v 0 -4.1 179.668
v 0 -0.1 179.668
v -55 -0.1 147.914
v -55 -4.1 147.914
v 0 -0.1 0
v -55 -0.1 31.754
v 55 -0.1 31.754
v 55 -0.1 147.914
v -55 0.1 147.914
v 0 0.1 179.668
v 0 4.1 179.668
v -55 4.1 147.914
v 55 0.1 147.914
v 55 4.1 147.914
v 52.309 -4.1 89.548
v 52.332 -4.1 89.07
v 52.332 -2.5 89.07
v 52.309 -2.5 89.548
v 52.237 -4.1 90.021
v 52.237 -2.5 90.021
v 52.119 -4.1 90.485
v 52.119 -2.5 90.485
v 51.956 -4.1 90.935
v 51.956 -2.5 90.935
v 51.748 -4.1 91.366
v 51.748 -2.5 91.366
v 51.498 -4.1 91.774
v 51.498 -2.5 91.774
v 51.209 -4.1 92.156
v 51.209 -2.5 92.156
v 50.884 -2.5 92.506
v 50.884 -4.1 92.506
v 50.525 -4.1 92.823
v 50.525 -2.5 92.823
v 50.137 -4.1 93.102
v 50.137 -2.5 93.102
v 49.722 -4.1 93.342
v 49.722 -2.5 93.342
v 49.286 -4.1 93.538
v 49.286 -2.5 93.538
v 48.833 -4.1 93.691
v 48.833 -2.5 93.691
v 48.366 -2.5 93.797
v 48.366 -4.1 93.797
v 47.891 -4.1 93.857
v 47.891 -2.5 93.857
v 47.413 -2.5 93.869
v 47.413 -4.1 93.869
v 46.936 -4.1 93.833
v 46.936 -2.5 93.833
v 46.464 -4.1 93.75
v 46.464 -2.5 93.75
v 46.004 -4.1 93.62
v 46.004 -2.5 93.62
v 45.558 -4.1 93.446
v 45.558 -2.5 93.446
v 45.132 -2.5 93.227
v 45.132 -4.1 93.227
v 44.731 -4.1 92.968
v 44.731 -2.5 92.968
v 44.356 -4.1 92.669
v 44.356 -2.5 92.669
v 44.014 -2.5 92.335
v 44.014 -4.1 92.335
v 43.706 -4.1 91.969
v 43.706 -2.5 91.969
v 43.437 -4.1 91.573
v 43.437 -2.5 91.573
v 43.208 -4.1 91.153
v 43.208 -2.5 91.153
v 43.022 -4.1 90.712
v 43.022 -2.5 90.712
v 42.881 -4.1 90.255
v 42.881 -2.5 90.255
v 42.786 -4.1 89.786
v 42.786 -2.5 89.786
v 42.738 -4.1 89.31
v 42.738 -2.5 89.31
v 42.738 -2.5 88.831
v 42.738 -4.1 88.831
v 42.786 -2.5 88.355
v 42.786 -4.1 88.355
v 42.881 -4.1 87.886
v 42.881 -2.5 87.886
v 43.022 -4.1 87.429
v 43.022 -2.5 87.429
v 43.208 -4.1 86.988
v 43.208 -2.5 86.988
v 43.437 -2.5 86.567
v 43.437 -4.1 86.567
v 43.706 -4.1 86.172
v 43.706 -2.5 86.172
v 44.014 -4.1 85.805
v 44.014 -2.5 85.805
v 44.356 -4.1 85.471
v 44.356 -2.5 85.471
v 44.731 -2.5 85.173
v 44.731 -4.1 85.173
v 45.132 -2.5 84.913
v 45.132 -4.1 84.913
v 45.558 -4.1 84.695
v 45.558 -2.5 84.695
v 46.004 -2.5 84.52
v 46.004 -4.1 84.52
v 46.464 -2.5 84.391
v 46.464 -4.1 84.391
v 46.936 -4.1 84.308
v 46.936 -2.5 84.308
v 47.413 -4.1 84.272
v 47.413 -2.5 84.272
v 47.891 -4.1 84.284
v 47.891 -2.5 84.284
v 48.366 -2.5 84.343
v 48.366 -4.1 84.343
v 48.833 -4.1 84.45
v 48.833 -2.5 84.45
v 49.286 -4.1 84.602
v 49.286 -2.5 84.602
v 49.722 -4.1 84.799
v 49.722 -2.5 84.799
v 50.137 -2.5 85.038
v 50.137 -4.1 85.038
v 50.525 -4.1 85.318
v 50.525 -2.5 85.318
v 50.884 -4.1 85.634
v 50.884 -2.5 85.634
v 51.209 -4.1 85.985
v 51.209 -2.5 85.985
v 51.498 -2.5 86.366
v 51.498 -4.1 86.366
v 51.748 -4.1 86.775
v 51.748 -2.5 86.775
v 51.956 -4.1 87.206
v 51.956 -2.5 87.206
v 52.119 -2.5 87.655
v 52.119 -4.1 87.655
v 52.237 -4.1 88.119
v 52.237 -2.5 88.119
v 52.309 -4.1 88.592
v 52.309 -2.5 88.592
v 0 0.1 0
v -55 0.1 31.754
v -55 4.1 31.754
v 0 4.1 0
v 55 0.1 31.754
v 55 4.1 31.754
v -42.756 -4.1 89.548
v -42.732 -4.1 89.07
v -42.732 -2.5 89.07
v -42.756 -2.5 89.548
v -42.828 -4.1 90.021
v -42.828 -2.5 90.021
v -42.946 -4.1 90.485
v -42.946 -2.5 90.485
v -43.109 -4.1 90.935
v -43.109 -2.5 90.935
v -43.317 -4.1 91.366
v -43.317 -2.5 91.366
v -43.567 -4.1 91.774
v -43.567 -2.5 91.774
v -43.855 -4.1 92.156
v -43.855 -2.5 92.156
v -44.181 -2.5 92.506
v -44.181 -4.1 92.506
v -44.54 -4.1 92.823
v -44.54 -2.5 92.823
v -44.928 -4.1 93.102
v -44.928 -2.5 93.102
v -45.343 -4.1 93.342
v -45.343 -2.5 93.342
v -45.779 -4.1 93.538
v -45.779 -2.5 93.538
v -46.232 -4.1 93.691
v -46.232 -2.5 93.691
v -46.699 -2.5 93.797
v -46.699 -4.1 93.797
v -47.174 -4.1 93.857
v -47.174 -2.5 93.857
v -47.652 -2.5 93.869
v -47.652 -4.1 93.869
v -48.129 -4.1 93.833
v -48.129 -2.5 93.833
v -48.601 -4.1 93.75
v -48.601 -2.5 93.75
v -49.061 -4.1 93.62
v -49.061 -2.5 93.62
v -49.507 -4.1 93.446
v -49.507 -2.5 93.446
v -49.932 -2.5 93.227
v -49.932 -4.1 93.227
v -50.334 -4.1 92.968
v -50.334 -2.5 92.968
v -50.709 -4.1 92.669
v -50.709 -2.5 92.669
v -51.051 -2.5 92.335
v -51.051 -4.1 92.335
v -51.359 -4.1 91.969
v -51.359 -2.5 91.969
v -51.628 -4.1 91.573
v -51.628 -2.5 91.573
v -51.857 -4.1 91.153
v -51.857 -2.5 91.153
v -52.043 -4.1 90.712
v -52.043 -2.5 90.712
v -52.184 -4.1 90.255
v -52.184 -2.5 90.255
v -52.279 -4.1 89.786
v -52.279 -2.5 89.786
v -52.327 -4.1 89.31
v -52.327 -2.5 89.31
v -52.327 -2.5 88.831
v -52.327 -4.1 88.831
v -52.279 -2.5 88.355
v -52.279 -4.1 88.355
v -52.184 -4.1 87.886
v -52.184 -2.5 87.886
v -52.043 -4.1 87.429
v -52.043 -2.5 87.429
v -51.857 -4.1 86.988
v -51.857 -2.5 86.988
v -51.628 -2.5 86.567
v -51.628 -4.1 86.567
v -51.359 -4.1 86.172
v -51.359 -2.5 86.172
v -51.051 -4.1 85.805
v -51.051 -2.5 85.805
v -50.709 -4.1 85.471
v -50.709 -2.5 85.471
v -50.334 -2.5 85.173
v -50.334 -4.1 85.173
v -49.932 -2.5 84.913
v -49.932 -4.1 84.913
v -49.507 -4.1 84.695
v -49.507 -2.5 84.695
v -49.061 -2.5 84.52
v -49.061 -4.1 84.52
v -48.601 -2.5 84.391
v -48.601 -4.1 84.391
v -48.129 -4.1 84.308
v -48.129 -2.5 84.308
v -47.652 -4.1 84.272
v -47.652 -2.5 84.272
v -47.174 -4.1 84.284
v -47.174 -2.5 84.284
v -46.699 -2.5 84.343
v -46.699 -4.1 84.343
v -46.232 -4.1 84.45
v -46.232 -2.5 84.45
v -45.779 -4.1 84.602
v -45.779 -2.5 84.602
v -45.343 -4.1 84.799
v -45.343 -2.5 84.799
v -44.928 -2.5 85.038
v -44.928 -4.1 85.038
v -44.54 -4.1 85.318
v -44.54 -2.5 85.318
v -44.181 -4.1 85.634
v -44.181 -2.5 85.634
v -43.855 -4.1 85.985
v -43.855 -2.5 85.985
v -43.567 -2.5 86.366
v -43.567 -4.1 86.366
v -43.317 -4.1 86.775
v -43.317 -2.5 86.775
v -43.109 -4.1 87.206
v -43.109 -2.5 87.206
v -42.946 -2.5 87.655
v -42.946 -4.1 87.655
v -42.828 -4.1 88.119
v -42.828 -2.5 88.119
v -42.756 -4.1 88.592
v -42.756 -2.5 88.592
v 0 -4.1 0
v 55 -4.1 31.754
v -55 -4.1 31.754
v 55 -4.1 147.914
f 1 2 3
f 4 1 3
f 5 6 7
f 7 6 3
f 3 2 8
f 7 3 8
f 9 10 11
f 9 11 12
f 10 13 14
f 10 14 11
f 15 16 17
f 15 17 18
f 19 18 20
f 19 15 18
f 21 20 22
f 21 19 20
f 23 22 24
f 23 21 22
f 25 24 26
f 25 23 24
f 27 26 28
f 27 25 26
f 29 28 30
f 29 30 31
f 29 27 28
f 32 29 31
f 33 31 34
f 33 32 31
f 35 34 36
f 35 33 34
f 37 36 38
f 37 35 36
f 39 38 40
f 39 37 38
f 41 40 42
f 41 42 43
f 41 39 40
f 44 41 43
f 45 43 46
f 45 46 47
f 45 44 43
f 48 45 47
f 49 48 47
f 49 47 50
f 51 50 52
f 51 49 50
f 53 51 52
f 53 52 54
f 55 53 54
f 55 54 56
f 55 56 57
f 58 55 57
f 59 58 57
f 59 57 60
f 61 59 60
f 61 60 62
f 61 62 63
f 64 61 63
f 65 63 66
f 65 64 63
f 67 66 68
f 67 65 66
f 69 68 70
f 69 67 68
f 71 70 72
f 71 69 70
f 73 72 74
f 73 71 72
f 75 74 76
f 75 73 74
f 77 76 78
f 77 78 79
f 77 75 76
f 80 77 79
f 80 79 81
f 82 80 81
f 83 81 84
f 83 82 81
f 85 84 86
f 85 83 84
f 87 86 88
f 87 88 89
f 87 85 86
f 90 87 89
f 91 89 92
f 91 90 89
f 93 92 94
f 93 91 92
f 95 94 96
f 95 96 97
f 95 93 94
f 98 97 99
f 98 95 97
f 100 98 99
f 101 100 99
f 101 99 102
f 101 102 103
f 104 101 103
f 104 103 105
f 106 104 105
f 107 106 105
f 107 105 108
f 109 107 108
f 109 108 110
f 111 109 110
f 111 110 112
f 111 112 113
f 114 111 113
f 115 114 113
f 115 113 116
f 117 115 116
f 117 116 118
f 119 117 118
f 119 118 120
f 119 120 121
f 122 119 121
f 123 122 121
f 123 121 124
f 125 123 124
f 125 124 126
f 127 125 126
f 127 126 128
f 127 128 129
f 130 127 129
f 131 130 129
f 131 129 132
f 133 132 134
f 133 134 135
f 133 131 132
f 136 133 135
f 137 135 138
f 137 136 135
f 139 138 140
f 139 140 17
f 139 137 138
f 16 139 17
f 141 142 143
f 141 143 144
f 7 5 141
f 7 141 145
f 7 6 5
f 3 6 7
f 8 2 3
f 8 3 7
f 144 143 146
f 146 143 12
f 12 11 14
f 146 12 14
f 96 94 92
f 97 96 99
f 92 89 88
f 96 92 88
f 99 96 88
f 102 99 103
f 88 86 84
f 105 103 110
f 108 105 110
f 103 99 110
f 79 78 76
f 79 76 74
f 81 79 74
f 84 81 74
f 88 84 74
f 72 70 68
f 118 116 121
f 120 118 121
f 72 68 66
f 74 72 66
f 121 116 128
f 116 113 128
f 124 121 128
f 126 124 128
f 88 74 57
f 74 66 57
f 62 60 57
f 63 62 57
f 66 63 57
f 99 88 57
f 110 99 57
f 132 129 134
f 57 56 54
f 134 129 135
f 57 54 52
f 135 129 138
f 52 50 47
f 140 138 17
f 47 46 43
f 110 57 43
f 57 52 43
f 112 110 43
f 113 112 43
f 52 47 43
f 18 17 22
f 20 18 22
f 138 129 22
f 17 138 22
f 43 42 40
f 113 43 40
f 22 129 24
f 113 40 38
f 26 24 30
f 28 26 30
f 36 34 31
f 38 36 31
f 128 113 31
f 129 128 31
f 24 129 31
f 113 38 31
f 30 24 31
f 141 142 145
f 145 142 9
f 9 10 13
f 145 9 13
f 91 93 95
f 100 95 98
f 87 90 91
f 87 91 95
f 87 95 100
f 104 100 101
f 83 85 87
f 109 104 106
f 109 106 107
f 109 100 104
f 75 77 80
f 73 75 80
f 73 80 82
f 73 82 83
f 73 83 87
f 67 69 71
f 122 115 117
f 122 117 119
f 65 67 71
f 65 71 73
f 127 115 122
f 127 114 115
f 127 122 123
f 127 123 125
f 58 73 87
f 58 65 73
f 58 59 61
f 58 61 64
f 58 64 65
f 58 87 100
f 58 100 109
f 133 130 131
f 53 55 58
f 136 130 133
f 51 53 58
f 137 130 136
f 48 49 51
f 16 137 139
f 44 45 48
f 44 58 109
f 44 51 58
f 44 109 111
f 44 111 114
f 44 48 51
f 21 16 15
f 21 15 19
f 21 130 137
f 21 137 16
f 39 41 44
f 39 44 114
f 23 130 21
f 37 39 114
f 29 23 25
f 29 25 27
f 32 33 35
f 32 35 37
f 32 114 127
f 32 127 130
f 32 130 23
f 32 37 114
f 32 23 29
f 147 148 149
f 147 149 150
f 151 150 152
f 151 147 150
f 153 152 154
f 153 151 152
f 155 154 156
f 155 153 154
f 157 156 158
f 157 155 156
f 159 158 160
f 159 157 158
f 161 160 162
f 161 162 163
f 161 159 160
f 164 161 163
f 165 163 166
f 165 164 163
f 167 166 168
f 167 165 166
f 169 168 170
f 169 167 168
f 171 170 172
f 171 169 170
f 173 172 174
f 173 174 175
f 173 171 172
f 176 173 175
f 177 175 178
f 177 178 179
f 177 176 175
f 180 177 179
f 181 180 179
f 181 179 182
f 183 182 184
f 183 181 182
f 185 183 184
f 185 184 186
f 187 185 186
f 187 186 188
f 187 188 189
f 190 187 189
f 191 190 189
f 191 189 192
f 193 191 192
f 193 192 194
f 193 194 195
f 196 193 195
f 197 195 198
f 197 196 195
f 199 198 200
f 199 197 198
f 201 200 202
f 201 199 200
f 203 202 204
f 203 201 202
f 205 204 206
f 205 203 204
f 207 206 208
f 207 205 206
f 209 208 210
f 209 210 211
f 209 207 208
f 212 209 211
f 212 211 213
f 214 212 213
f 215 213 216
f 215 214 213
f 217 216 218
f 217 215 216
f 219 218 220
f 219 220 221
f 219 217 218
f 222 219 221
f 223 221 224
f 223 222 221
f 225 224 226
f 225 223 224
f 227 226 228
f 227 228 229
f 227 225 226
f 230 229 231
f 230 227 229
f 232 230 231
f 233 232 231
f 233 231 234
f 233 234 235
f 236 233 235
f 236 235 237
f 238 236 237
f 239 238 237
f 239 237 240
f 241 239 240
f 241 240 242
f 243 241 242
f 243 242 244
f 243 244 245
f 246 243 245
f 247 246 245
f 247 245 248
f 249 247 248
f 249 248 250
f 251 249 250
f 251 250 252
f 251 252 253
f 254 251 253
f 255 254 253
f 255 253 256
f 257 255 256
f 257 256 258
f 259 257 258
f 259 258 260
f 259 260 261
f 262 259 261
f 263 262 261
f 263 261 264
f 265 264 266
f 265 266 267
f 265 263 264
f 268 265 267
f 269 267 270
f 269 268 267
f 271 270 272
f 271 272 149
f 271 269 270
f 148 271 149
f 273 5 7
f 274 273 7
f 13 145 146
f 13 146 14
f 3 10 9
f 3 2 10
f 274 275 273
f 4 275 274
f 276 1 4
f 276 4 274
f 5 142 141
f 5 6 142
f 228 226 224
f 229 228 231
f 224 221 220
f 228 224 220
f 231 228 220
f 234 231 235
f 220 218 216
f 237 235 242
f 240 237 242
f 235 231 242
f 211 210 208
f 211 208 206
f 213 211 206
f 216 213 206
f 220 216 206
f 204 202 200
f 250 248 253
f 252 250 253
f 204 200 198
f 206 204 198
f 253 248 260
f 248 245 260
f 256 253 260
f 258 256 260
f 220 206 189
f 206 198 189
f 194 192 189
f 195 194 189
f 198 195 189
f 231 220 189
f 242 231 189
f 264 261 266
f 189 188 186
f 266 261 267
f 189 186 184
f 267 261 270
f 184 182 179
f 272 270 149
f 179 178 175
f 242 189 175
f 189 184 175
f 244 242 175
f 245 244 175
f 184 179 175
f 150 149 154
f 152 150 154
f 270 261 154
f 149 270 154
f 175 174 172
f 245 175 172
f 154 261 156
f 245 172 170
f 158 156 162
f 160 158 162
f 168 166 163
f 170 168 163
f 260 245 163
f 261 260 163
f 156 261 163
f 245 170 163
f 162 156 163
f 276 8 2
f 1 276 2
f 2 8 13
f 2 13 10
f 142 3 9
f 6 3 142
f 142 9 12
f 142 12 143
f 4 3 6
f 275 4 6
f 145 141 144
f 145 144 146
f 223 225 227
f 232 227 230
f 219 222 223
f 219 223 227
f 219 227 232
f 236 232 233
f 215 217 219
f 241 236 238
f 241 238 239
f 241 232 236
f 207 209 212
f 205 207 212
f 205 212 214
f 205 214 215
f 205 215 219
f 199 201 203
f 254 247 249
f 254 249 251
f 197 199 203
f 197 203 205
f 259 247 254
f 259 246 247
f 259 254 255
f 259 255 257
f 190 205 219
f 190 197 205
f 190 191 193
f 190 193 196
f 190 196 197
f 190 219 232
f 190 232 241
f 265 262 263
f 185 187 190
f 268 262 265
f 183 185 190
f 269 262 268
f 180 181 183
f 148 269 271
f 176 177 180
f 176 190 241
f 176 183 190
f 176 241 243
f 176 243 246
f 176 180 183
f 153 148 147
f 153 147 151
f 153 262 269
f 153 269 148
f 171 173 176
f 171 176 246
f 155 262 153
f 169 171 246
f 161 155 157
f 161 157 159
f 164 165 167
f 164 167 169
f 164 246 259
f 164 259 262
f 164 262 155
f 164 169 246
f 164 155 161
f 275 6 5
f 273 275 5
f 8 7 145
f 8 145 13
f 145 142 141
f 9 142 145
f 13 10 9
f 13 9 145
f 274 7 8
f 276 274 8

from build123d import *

# Parameters (mm, degrees)
F1_DEPTH = 0.1
F3_DEPTH = 4
F4_R     = 4.8
F5_DEPTH = 1.6
F7_R     = 4.8
F8_DEPTH = 1.6


# Not quite as in the source:
# - a feature names something its author has since deleted; it is built from what else it names


with BuildPart() as f1:
    # F0 (on Front) → F1 (new body, symmetric)
    with BuildSketch(Plane.XZ):
        Polygon((-55, 31.7542648054), (0, 0), (55, 31.7542648054), (55, 147.9135872183), (0, 179.6678520237), (-55, 147.9135872183), align=None)
    extrude(amount=F1_DEPTH, both=True)

    # F4 (on face) → F5 (cut)
    with BuildSketch(Plane.XZ.offset(4.1)):
        with Locations((62, 89.8339260119)):
            Circle(F4_R)
        with Locations((-62, 89.8339260119)):
            Circle(F4_R)
    extrude(amount=-F5_DEPTH, mode=Mode.SUBTRACT)


with BuildPart() as f3:
    # F2 (on face) → F3 (new body)
    with BuildSketch(Plane.XZ.offset(0.1)):
        Polygon((0, 179.6678520237), (-55, 147.9135872183), (-55, 31.7542648054), (0, 0), (55, 31.7542648054), (55, 147.9135872183), align=None)
    extrude(amount=F3_DEPTH)


with BuildPart() as f6_1:
    # F6: instance of F3
    add(f3.part.mirror(Plane.XZ))


with BuildPart() as f8:
    # F7 (on face) → F8 (new body)
    with BuildSketch(Plane.XZ.offset(4.1)):
        with Locations((-47.5324755942, 89.0702977777)):
            Circle(F7_R)
    extrude(amount=-F8_DEPTH)


with BuildPart() as f8b:
    # F7 (on face) → F8, piece 2 (new body)
    with BuildSketch(Plane.XZ.offset(4.1)):
        with Locations((47.5324755942, 89.0702977777)):
            Circle(F7_R)
    extrude(amount=-F8_DEPTH)


solid = Compound([f1.part, f3.part, f6_1.part, f8.part, f8b.part])
